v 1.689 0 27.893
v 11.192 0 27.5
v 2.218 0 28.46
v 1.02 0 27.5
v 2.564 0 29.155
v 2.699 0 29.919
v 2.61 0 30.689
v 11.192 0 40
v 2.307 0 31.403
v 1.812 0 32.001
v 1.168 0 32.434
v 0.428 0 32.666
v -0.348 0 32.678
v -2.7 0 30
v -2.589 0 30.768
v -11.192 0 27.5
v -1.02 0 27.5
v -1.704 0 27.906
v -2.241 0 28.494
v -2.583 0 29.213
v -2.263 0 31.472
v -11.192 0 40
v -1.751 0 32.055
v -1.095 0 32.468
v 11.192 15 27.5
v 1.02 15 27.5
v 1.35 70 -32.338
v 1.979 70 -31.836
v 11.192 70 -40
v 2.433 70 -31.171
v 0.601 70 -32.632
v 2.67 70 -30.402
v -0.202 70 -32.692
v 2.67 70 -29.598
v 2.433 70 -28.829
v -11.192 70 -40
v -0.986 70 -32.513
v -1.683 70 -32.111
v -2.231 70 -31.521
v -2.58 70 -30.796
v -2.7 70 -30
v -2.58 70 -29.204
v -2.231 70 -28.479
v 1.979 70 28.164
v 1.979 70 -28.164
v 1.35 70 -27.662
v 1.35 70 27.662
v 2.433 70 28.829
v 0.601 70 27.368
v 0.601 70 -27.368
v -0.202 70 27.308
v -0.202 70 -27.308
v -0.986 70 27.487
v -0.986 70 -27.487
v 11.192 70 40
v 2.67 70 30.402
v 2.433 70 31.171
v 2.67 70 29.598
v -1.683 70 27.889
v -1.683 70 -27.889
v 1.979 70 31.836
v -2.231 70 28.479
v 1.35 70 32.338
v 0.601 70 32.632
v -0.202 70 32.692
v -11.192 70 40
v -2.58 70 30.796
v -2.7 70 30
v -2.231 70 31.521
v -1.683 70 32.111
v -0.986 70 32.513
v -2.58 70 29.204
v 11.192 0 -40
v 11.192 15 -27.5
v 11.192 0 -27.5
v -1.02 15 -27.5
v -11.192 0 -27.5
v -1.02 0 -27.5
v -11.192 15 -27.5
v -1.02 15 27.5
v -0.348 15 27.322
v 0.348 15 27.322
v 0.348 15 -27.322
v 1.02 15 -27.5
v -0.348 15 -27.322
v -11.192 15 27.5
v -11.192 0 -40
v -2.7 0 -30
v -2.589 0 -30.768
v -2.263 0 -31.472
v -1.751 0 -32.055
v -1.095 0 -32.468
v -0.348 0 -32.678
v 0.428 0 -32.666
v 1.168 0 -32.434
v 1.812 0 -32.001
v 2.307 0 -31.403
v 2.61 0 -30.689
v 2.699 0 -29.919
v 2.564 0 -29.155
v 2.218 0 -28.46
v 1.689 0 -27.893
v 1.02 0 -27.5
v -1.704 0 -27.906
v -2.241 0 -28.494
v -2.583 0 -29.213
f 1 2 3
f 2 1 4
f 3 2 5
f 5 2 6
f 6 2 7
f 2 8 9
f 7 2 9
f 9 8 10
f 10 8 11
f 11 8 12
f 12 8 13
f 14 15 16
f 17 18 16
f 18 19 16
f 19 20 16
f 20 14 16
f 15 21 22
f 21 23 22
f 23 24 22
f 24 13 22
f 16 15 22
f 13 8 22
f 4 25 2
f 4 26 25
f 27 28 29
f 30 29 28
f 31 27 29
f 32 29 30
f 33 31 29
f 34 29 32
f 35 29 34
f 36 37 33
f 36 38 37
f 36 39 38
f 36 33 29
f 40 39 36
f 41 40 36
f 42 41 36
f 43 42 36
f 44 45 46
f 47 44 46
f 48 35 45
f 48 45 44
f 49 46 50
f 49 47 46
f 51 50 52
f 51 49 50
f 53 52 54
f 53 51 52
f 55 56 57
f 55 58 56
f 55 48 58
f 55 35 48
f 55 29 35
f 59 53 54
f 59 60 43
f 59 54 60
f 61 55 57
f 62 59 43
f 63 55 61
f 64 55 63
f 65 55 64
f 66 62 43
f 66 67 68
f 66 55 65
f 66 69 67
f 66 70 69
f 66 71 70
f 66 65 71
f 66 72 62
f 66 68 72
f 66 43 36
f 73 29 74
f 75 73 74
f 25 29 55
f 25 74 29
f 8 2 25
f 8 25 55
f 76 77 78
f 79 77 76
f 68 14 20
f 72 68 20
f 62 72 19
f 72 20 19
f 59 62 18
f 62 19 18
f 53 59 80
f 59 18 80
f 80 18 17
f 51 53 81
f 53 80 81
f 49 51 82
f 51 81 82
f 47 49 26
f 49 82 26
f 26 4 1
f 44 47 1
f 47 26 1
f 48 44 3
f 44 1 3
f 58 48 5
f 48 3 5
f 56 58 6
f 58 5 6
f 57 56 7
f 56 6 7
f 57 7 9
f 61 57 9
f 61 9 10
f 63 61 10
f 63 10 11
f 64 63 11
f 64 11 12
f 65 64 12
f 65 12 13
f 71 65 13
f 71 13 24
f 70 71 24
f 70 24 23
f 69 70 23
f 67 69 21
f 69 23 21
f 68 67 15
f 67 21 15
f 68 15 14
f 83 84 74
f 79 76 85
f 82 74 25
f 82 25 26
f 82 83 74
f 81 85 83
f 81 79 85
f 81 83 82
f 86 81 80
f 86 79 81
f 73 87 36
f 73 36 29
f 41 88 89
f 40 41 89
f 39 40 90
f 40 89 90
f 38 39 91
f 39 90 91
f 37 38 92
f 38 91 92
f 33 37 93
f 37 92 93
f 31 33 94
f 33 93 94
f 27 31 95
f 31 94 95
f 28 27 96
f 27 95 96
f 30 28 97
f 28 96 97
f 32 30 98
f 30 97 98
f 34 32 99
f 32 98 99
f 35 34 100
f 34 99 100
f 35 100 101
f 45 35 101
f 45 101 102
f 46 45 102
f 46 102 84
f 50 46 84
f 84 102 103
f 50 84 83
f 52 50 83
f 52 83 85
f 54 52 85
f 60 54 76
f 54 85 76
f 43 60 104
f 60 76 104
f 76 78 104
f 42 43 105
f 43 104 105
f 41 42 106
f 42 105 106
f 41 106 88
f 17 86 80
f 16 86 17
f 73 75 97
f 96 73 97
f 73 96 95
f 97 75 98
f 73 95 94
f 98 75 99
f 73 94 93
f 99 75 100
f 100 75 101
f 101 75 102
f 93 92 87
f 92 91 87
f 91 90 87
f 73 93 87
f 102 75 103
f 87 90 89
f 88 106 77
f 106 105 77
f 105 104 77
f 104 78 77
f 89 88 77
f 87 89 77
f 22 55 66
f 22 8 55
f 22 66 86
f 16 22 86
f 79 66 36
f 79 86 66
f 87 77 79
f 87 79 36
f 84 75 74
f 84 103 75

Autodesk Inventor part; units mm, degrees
ref_plane "YZ Plane" through (0, 0, 0) normal (1, 0, 0) x (0, 1, 0)
ref_plane "XZ Plane" through (0, 0, 0) normal (0, 1, 0) x (-1, 0, 0)
ref_plane "XY Plane" through (0, 0, 0) normal (0, 0, 1) x (1, 0, 0)
sketch "Boceto1" plane through (0, 0, 0) normal (0, 1, 0) x (-1, 0, 0)
  line L0 (-11.1918, 40) -> (11.1918, 40)
  line L1 (11.1918, 40) -> (11.1918, -40)
  line L2 (11.1918, -40) -> (-11.1918, -40)
  line L3 (-11.1918, -40) -> (-11.1918, 40)
  line L4 (-11.1918, 40) -> (11.1918, -40) construction
  line L5 (11.1918, 40) -> (-11.1918, -40) construction
  circle A0 centre (0, 30) radius 2.7
  circle A1 centre (0, -30) radius 2.7
  point P0 (0, 0)
  dimension "d0" = 5.4
  dimension "d1" = 80
  dimension "d2" = 10
  dimension "d3" = 10
extrude "Extrusión1" add sketch "Boceto1" along normal blind 70
sketch "Boceto2" plane through (-11.1918, 0, -40) normal (-1, 0, 0) x (0, 0, 1)
  line L0 (67.5, -15) -> (12.5, -15)
  line L1 (12.5, -15) -> (12.5, 15)
  line L2 (12.5, 15) -> (67.5, 15)
  line L3 (67.5, 15) -> (67.5, -15)
  line L4 (67.5, -15) -> (12.5, 15) construction
  line L5 (12.5, -15) -> (67.5, 15) construction
  point P0 (40, 0)
  dimension "d6" = 55
  dimension "d7" = 30
extrude "Extrusión2" cut sketch "Boceto2" against normal through all
properties part number "LowerJawSupport"
